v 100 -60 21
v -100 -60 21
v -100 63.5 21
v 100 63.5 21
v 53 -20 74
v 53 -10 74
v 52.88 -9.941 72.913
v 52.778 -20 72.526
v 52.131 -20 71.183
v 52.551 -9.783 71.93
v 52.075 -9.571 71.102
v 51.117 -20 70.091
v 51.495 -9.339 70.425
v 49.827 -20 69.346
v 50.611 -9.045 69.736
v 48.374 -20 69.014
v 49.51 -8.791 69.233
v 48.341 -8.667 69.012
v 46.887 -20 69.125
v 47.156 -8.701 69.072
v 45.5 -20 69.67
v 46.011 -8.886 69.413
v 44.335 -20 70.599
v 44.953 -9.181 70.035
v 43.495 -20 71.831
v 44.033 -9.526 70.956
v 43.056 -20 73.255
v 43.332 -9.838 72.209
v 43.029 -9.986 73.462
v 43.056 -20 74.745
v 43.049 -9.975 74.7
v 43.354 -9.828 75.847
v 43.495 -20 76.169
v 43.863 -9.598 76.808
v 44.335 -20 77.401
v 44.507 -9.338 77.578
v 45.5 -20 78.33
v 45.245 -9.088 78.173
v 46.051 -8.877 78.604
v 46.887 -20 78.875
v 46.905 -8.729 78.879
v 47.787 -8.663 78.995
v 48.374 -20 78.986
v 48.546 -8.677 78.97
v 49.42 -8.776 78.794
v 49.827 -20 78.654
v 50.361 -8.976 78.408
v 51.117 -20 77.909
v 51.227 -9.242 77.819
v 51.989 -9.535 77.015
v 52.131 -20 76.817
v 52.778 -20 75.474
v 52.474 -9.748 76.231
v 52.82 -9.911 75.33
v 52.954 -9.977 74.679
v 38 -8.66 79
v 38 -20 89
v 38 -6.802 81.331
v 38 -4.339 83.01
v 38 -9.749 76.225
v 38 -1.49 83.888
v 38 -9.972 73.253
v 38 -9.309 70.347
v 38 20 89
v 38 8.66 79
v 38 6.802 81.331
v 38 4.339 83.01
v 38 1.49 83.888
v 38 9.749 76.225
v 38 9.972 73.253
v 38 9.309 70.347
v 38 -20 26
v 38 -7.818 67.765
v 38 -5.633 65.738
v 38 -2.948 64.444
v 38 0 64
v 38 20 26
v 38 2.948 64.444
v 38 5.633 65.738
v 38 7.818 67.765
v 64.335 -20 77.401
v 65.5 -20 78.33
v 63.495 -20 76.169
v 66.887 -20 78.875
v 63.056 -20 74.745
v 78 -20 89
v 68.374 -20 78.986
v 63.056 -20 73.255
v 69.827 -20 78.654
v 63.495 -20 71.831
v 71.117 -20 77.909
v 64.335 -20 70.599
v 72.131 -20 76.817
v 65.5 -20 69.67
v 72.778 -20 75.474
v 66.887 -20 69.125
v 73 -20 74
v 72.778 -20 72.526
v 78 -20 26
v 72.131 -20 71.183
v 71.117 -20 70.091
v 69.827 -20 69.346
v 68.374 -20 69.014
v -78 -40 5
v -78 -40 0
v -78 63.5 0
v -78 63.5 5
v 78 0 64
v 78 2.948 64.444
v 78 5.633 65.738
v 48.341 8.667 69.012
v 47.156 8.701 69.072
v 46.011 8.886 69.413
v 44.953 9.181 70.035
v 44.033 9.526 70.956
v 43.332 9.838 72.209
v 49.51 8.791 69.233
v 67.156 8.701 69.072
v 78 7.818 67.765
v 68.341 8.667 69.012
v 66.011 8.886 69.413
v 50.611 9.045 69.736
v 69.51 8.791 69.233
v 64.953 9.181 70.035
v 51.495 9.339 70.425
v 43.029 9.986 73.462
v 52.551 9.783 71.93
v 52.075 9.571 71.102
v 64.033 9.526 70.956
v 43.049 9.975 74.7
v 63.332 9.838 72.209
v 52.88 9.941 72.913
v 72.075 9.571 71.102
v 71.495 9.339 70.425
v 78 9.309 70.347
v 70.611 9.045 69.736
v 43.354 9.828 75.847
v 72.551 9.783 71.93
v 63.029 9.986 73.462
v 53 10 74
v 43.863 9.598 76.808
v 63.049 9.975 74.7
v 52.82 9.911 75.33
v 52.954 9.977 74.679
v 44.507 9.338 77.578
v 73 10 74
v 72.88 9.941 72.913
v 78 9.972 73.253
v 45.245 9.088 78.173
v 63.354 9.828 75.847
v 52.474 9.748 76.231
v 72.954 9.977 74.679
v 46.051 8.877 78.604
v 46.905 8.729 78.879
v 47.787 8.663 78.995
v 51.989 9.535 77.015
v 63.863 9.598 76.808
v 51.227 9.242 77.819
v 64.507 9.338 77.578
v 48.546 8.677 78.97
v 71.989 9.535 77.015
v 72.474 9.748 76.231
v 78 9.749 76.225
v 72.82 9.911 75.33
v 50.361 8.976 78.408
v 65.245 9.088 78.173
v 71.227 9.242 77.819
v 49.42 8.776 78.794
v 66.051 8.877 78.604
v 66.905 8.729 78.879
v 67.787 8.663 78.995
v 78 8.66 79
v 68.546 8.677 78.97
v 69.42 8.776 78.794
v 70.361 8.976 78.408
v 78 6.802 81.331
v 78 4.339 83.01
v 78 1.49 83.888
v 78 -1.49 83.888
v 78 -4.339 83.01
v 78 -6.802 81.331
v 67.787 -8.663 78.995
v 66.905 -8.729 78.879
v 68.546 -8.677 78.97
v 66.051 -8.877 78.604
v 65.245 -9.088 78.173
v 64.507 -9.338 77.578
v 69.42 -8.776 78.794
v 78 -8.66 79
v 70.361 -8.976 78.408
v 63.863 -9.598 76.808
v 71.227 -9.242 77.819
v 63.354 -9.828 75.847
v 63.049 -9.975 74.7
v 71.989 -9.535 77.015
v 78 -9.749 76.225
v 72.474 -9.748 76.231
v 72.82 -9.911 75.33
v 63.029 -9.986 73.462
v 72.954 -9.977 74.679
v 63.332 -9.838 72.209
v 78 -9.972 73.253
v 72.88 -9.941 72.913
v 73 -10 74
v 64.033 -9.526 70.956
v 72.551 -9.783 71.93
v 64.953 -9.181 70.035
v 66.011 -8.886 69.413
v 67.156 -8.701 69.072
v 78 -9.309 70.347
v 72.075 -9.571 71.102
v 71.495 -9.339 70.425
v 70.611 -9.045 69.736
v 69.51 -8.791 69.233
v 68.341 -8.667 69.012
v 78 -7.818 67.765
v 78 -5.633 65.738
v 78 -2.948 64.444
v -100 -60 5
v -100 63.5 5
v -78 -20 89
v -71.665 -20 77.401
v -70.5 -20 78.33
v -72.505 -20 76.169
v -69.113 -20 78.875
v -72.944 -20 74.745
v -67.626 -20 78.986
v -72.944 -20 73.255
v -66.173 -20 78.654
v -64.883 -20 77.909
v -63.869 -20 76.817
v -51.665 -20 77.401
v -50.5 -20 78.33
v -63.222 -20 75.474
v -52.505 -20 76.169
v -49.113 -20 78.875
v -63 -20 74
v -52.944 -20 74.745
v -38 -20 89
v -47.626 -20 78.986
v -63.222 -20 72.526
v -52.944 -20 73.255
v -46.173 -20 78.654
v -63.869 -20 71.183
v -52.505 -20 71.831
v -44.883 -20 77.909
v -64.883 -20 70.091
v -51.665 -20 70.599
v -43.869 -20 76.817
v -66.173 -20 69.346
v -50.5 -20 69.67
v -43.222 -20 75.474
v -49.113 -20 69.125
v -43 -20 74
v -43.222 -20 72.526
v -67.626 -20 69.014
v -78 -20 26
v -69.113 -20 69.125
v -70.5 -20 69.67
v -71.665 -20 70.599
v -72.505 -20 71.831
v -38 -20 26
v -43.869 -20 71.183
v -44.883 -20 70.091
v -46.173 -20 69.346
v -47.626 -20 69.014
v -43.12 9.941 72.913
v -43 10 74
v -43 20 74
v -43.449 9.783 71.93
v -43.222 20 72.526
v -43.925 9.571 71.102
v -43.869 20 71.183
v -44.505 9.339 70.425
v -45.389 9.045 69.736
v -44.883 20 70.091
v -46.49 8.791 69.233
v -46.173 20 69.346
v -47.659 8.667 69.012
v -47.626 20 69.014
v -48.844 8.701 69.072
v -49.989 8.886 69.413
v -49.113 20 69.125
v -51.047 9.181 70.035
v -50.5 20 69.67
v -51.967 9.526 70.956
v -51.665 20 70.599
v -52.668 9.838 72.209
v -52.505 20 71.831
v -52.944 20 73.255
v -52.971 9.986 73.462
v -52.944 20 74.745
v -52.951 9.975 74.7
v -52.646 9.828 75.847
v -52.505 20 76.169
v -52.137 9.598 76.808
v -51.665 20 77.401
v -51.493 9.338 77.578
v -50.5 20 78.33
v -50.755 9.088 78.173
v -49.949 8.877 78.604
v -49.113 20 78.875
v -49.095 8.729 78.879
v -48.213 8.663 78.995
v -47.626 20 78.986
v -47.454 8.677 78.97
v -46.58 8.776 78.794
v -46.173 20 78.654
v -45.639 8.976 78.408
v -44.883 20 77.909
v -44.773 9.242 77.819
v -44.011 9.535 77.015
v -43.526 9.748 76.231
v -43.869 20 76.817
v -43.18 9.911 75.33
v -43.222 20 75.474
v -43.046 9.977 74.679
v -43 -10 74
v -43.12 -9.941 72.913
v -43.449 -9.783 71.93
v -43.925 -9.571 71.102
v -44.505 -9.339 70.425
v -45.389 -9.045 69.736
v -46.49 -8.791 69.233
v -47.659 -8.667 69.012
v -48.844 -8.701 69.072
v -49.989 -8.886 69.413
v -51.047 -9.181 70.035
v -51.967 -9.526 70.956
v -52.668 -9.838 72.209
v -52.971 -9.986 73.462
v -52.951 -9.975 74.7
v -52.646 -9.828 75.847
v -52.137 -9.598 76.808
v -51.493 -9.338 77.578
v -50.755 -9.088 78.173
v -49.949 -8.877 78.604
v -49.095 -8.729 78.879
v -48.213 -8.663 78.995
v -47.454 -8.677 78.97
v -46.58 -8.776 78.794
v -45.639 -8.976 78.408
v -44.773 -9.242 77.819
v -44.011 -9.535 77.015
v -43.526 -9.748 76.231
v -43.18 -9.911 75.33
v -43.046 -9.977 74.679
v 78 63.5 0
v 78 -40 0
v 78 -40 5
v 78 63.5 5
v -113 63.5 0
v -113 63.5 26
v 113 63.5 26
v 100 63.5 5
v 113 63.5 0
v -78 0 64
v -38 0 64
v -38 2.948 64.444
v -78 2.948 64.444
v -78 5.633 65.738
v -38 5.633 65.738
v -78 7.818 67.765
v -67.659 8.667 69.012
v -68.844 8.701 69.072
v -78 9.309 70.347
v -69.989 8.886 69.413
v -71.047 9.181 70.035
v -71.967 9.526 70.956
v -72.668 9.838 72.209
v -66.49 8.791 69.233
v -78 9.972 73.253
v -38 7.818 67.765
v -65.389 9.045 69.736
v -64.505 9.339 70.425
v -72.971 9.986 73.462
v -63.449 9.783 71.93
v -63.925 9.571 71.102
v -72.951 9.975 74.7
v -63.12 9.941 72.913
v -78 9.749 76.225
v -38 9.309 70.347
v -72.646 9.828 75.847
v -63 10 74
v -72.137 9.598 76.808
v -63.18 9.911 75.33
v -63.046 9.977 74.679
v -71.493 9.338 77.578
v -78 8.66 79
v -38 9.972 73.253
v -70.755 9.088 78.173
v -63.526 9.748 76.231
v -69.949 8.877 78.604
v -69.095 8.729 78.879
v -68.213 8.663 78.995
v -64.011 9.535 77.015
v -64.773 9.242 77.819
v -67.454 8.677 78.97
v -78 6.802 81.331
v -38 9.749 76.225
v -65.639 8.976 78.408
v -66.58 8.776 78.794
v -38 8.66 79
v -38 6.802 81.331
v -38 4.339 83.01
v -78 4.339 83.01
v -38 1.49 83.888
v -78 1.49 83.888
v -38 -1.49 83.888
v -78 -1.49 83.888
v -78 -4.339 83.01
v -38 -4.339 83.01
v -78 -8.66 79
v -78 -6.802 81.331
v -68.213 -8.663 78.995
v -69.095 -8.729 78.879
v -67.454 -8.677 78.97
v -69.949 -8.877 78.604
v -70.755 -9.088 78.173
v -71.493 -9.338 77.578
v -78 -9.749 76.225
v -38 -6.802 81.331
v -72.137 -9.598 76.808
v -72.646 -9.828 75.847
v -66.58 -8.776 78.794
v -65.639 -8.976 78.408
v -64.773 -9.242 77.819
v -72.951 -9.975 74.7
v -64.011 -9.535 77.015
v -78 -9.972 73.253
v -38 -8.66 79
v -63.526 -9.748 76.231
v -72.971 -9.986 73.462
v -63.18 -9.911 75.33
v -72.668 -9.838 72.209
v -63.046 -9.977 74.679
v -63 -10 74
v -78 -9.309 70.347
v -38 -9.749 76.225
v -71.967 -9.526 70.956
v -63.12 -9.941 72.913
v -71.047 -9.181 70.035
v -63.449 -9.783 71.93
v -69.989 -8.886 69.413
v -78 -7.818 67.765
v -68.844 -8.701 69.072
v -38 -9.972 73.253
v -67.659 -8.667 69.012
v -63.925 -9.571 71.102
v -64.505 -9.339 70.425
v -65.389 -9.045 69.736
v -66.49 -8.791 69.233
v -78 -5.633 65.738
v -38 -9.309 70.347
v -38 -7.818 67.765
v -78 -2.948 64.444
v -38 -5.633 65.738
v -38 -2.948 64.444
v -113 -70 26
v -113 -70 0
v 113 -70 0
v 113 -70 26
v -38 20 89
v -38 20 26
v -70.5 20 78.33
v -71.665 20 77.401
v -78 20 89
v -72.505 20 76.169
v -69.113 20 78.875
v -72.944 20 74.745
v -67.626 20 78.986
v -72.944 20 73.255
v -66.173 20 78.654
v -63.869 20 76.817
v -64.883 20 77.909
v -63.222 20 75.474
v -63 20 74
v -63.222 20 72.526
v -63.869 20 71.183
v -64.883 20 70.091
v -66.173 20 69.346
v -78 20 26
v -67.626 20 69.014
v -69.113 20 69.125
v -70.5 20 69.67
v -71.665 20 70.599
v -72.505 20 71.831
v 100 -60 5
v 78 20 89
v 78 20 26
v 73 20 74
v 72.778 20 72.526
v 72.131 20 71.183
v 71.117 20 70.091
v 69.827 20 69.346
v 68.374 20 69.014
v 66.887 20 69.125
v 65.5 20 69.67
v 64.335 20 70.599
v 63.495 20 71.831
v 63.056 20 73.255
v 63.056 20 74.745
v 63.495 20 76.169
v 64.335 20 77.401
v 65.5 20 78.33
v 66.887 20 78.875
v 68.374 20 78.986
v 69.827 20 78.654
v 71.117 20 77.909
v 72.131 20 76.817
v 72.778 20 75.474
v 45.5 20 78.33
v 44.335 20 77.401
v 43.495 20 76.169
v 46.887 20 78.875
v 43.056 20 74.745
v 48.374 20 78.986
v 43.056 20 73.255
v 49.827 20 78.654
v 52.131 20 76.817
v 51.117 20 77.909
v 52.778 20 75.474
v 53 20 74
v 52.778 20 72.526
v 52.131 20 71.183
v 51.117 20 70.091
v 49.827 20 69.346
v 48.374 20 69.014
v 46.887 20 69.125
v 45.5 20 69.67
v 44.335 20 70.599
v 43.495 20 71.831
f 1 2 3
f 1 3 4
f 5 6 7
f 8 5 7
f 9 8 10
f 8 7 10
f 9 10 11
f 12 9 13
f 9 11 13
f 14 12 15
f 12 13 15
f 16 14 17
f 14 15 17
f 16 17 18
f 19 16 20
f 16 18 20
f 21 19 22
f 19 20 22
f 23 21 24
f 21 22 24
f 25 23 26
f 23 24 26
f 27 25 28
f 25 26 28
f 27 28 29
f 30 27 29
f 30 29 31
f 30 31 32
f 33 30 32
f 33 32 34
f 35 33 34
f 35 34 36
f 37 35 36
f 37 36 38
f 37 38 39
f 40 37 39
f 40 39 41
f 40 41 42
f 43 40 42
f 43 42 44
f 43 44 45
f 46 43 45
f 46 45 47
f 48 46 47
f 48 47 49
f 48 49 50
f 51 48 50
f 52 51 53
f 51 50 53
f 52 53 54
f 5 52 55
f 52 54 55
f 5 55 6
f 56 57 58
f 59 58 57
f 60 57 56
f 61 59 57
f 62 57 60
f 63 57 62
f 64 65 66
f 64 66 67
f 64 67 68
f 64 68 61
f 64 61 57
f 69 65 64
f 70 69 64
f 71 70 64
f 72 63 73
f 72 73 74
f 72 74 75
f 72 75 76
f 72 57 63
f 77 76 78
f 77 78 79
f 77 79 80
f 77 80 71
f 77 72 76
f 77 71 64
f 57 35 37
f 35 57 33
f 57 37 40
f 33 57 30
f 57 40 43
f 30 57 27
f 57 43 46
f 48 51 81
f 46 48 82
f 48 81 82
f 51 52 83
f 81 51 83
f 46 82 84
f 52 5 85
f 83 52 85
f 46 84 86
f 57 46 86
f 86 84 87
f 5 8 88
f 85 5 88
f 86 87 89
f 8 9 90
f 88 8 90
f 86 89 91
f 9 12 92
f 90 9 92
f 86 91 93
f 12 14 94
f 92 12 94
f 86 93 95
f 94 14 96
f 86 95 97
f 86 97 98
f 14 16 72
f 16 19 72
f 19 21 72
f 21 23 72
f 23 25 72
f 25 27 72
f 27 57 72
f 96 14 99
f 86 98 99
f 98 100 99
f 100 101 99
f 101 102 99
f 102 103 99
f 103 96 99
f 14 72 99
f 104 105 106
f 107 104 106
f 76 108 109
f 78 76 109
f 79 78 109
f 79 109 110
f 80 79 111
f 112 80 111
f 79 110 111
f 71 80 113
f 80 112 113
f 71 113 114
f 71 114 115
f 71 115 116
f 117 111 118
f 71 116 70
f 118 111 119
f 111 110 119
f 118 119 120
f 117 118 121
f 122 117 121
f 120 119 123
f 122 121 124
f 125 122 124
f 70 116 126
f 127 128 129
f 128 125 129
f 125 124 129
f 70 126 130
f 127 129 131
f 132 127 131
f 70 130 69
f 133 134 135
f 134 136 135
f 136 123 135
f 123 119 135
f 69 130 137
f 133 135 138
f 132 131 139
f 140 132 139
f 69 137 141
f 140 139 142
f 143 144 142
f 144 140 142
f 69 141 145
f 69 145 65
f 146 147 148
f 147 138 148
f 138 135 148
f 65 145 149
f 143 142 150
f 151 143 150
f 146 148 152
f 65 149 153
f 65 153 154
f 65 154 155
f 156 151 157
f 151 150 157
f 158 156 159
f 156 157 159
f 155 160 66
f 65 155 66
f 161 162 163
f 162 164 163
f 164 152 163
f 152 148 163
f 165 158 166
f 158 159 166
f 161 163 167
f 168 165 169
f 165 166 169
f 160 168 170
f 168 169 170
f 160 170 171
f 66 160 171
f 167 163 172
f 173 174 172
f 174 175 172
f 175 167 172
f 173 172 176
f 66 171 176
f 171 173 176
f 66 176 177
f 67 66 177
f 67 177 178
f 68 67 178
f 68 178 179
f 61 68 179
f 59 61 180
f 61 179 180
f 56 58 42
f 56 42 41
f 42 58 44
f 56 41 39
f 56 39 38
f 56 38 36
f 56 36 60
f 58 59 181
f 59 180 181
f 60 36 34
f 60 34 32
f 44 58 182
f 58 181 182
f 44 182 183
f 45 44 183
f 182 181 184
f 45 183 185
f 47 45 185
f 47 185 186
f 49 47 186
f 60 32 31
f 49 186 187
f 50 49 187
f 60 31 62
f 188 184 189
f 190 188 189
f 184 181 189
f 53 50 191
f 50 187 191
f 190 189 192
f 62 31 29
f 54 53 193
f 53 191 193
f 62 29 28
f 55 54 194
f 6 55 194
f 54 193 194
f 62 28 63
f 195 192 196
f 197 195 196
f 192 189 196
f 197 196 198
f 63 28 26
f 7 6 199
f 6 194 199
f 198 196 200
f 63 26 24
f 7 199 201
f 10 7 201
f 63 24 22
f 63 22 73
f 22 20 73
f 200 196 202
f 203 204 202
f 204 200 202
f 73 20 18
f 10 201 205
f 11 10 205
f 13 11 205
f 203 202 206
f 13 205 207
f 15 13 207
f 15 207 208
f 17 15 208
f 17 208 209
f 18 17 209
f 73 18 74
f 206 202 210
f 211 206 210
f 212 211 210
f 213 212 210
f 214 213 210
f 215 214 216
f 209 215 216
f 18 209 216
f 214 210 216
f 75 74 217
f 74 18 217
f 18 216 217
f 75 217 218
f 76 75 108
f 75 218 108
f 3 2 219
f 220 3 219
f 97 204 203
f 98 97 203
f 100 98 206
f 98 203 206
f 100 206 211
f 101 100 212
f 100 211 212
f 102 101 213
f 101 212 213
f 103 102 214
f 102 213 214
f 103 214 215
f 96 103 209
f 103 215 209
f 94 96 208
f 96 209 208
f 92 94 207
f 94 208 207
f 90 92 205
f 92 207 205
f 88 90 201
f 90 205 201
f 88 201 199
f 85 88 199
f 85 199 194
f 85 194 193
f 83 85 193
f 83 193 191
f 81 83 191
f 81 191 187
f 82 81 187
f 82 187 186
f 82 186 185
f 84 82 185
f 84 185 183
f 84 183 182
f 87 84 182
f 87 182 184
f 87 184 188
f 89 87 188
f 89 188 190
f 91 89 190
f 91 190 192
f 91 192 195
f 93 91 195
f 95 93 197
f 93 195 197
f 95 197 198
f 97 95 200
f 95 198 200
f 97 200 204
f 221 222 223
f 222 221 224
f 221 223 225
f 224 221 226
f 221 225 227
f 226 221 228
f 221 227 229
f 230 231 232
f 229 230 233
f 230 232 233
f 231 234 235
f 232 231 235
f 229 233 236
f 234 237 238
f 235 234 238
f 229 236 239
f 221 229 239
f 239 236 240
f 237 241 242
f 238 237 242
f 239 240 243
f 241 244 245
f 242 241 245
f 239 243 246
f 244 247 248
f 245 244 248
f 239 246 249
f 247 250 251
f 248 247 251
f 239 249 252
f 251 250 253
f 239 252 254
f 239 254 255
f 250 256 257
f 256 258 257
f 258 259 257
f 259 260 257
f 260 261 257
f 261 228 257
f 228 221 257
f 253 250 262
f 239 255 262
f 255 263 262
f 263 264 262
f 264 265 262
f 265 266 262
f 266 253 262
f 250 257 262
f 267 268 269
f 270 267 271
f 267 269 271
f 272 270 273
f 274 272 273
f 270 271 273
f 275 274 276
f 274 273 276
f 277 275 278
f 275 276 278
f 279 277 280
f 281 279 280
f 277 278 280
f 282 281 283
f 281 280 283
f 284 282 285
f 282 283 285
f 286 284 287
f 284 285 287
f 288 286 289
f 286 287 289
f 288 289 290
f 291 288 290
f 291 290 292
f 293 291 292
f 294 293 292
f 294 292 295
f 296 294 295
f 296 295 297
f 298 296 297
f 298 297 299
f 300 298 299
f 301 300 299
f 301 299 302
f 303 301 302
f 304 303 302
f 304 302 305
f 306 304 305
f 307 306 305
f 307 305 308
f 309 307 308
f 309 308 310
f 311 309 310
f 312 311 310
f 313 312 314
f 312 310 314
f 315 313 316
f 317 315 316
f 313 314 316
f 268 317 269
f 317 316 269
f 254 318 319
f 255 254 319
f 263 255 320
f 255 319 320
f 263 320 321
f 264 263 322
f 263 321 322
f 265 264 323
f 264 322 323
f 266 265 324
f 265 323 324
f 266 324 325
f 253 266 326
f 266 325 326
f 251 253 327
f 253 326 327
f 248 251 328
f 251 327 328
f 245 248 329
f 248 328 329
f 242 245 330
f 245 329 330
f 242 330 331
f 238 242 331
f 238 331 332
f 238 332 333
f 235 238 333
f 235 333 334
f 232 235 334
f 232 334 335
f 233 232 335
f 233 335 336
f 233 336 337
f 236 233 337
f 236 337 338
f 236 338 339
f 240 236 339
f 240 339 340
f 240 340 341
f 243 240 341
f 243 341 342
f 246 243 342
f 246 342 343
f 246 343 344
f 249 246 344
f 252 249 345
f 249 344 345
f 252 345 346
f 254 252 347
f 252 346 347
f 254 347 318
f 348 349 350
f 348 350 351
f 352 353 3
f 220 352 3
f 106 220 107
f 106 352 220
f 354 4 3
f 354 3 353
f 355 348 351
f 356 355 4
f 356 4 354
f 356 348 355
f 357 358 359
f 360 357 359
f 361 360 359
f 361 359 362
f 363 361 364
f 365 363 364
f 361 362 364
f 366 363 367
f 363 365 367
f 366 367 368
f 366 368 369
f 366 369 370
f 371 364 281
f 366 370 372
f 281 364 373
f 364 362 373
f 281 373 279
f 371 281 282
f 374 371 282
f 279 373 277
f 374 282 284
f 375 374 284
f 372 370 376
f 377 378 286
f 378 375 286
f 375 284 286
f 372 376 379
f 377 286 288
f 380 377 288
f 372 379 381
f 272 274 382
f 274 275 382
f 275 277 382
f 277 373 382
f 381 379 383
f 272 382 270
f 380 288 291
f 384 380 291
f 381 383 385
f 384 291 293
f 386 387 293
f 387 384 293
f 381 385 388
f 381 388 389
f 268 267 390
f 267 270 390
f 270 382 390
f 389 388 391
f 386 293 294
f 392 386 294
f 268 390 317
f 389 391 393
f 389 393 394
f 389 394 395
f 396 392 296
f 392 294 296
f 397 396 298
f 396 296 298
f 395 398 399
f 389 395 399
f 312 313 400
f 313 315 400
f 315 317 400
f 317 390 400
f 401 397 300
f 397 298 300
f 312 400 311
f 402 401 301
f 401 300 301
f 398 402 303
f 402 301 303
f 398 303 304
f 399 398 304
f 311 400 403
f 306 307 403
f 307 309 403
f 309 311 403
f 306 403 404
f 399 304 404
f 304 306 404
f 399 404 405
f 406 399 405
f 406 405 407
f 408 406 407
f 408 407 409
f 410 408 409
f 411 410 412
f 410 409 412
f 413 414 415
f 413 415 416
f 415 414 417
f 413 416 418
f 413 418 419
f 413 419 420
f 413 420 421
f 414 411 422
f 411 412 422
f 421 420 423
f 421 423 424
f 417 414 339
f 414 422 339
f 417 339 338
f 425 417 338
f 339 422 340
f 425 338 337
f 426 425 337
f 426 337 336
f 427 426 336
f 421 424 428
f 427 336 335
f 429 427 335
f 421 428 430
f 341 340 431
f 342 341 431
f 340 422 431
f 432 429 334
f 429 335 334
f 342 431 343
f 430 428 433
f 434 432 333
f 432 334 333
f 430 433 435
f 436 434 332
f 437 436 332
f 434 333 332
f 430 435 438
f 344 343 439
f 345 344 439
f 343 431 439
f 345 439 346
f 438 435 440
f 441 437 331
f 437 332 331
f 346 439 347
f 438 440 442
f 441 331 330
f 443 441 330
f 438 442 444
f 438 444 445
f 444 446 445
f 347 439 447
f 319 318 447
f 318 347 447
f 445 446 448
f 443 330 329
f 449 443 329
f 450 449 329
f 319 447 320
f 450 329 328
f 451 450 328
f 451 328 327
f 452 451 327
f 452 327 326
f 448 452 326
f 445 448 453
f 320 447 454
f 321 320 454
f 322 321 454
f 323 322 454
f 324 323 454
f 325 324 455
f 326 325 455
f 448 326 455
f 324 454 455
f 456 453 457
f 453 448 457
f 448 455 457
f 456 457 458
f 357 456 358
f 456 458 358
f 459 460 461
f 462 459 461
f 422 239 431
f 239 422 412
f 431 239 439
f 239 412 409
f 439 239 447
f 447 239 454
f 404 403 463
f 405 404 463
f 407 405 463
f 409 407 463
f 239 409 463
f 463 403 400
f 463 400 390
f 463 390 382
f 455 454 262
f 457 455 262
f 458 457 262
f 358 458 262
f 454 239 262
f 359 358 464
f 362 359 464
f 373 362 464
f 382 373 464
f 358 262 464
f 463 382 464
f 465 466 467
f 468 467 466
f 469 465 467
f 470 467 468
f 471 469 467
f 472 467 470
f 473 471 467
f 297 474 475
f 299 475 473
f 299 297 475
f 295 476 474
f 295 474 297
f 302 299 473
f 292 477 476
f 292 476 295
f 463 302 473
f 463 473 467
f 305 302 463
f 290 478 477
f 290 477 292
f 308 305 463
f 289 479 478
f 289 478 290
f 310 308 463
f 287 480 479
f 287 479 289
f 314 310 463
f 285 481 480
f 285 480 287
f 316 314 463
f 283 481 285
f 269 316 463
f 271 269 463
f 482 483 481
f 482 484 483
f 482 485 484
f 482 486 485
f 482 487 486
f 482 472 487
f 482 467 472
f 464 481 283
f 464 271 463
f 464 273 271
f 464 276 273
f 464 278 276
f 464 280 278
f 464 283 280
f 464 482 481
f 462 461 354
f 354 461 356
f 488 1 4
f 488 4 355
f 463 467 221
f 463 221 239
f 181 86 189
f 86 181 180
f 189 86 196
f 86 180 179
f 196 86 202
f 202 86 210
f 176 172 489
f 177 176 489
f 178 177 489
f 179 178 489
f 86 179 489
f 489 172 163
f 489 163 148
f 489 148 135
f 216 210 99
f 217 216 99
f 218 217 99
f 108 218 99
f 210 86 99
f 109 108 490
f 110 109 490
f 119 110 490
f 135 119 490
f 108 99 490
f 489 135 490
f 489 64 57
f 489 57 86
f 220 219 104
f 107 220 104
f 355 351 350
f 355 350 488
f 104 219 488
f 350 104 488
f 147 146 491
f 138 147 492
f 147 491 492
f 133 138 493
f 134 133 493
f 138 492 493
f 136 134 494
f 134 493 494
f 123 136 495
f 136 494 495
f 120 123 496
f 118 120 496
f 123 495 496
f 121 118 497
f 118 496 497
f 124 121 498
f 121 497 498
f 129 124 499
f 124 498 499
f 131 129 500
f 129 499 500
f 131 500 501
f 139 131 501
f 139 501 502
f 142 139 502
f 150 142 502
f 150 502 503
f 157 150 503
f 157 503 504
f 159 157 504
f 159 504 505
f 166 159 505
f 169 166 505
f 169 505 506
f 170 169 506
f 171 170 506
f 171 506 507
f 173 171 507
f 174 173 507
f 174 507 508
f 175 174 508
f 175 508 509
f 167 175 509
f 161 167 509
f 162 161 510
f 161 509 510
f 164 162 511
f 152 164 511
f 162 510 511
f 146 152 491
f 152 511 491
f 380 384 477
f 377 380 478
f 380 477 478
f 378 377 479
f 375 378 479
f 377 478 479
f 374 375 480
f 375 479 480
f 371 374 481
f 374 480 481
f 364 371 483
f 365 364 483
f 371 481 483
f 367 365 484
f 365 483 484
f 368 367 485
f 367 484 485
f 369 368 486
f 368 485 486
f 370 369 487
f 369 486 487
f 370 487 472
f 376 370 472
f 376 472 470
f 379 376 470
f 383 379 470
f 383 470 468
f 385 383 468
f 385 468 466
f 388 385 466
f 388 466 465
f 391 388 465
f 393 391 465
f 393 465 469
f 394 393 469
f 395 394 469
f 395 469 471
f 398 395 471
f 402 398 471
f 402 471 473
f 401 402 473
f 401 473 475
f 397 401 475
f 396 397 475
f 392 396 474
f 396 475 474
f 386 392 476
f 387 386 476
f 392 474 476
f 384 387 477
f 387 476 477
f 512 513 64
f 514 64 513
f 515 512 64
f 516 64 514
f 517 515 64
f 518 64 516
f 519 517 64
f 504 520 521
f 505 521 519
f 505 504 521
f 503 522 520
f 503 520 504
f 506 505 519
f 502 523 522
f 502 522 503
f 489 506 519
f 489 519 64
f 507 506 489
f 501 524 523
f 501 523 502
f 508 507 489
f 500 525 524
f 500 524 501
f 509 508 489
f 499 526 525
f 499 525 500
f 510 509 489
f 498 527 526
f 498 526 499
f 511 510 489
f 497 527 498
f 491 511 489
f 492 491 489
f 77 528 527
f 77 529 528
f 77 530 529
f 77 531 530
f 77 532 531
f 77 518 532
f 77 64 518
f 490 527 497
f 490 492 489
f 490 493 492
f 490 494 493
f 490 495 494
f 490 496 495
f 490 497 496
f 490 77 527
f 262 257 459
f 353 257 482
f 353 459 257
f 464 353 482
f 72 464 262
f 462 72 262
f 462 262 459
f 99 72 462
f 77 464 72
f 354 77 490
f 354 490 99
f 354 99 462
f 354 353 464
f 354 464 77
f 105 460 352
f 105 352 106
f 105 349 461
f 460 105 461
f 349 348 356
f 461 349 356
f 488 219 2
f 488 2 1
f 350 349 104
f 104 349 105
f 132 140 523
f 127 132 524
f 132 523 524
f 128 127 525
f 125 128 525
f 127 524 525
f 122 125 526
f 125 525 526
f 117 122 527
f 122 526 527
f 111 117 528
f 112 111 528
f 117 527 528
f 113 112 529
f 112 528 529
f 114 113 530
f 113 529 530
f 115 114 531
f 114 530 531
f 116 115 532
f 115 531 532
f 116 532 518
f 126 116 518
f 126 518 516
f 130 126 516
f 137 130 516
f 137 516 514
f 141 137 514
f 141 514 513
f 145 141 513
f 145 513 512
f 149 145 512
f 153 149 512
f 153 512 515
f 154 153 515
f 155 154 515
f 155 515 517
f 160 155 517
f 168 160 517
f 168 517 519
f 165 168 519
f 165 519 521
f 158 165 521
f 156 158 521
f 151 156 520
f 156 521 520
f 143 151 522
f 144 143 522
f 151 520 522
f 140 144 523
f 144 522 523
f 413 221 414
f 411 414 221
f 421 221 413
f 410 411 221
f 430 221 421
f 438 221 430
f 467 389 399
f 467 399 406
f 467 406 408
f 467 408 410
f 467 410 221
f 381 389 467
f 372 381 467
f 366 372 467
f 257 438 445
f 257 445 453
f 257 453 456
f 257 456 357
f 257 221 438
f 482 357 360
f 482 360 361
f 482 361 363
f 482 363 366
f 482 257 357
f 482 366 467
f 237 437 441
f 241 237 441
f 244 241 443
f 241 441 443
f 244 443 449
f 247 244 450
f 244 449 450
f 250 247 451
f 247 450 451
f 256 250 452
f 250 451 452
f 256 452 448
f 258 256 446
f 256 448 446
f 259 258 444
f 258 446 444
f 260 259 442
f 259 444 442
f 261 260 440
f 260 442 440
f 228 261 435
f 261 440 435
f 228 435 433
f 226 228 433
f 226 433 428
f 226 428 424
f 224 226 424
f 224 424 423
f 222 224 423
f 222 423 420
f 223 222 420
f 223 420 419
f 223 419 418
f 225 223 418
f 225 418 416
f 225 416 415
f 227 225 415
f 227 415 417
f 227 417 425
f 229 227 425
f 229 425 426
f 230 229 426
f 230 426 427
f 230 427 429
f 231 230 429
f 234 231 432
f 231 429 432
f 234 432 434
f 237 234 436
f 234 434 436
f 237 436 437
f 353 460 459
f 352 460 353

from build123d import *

# Parameters (mm, degrees)
SKETCH3_W               = 226
SKETCH3_H               = 133.5
BOSS_EXTRUDE1_DEPTH     = 26
SKETCH4_W               = 200
SKETCH4_H               = 16
CUT_EXTRUDE2_DEPTH      = 64.5
CUT_EXTRUDE2_DEPTH_BACK = 60
SKETCH6_W               = 40
SKETCH6_H               = 40
BOSS_EXTRUDE5_DEPTH     = 63
SKETCH7_R               = 10
CUT_EXTRUDE3_DEPTH      = 260
SKETCH13_R              = 5
CUT_EXTRUDE6_DEPTH      = 91
SKETCH10_W              = 156
SKETCH10_H              = 103.5
CUT_EXTRUDE5_DEPTH      = 5


with BuildPart() as part:
    # Sketch3 → Boss-Extrude1 (new body)
    with BuildSketch(Plane.XY):
        with Locations((0, -3.25)):
            Rectangle(SKETCH3_W, SKETCH3_H)
    extrude(amount=BOSS_EXTRUDE1_DEPTH)

    # Sketch4 → Cut-Extrude2 (cut, two sides)
    with BuildSketch(Plane(origin=(0, 0, 0), x_dir=(1, 0, 0), z_dir=(0, 1, 0))) as cut_extrude2_sk:
        with Locations((0, -13)):
            Rectangle(SKETCH4_W, SKETCH4_H)
    extrude(amount=CUT_EXTRUDE2_DEPTH, mode=Mode.SUBTRACT)
    extrude(cut_extrude2_sk.sketch, amount=-CUT_EXTRUDE2_DEPTH_BACK, mode=Mode.SUBTRACT)

    # Sketch6 → Boss-Extrude5 (add)
    with BuildSketch(Plane.XY.offset(26)):
        with Locations((-58, 0)):
            Rectangle(SKETCH6_W, SKETCH6_H)
        with Locations((58, 0)):
            Rectangle(SKETCH6_W, SKETCH6_H)
    extrude(amount=BOSS_EXTRUDE5_DEPTH)

    # Sketch7 → Cut-Extrude3 (cut)
    with BuildSketch(Plane(origin=(113, 0, 0), x_dir=(0, 0, -1), z_dir=(1, 0, 0))):
        with Locations((-74, 0)):
            Circle(SKETCH7_R)
    extrude(amount=-CUT_EXTRUDE3_DEPTH, mode=Mode.SUBTRACT)

    # Sketch13 → Cut-Extrude6 (cut, through all)
    with BuildSketch(Plane(origin=(0, 20, 0), x_dir=(1, 0, 0), z_dir=(0, 1, 0))):
        with Locations((-68, -74)):
            Circle(SKETCH13_R)
        with Locations((-48, -74)):
            Circle(SKETCH13_R)
        with Locations((48, -74)):
            Circle(SKETCH13_R)
        with Locations((68, -74)):
            Circle(SKETCH13_R)
    extrude(amount=-CUT_EXTRUDE6_DEPTH, mode=Mode.SUBTRACT)

    # Sketch10 → Cut-Extrude5 (cut)
    with BuildSketch(Plane(origin=(0, 0, 0), x_dir=(-1, 0, 0), z_dir=(0, 0, -1))):
        with Locations((0, 11.75)):
            Rectangle(SKETCH10_W, SKETCH10_H)
    extrude(amount=-CUT_EXTRUDE5_DEPTH, mode=Mode.SUBTRACT)


solid = part.part
